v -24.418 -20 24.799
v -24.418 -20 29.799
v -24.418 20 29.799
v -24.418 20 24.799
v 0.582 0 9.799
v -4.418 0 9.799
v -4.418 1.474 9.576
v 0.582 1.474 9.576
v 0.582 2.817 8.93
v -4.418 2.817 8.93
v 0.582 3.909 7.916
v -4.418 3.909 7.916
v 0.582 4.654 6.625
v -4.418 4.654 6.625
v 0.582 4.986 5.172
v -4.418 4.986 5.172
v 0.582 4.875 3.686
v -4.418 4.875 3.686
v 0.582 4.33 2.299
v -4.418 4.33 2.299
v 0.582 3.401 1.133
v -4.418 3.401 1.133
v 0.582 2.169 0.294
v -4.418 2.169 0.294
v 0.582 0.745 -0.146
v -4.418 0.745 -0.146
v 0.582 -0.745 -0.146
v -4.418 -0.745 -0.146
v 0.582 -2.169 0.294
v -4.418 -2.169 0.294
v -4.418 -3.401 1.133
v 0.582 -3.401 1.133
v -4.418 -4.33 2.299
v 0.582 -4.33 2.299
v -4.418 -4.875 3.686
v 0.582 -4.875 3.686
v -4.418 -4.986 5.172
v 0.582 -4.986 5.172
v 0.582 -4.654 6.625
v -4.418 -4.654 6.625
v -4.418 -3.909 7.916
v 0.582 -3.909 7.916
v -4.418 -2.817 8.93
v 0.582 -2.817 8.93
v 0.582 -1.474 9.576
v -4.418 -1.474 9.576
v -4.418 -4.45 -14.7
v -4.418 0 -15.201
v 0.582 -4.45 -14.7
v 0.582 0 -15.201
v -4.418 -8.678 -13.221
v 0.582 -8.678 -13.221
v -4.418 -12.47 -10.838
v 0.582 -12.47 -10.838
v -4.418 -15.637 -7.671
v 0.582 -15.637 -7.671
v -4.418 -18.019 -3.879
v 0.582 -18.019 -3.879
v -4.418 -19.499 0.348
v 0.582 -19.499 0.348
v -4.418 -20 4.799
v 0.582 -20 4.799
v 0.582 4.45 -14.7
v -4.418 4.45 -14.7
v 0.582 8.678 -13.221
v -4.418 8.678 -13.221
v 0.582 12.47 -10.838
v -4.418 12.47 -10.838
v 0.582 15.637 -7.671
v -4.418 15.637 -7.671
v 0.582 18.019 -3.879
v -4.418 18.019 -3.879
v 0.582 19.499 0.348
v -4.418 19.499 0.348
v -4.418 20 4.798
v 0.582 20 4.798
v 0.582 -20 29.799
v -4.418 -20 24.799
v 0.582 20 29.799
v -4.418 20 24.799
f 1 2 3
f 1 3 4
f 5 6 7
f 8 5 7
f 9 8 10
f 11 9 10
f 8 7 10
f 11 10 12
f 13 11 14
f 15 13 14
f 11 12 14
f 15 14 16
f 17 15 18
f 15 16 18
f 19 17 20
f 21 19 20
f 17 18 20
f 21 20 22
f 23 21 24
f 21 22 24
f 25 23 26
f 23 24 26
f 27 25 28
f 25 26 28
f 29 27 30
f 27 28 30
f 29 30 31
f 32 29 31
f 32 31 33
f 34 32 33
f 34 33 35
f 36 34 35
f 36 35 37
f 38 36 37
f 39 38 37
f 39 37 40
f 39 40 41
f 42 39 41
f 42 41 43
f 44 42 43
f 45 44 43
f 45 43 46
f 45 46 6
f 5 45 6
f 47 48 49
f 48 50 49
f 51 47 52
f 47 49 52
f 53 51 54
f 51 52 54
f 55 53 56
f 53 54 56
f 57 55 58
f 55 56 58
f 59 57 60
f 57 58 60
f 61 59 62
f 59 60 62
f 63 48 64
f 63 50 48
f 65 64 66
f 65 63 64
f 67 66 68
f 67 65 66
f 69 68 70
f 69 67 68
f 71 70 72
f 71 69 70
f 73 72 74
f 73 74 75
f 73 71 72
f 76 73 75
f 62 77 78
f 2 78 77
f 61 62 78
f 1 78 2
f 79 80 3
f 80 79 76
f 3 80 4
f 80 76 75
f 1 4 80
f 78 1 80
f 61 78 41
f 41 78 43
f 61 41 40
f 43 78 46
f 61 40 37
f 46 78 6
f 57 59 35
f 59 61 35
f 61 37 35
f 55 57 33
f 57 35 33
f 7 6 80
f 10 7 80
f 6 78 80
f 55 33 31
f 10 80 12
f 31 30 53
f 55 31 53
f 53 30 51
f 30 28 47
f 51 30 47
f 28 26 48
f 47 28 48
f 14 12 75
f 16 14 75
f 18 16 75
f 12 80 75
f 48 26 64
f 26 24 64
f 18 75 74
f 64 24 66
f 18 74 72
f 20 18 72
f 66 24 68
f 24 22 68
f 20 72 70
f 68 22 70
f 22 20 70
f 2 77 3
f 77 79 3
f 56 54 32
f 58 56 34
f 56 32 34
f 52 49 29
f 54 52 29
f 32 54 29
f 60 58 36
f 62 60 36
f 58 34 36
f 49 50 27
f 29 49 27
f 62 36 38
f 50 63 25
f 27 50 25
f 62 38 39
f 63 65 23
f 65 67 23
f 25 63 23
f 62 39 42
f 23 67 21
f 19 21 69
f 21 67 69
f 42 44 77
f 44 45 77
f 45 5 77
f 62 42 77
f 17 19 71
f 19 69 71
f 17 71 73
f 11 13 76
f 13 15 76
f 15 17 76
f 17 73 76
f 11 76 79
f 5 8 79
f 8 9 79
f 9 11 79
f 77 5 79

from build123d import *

# Parameters (mm, degrees)
BOSS_EXTRUDE1_DEPTH = 20
FILLET1_R           = 20
FILLET2_R           = 20
SKETCH2_R           = 5
CUT_EXTRUDE2_DEPTH  = 40


with BuildPart() as part:
    # Sketch1 → Boss-Extrude1 (new, symmetric)
    with BuildSketch(Plane(origin=(0, 0, 0), x_dir=(1, 0, 0), z_dir=(0, 1, 0))):
        Polygon((-4.418120101, 15.201487277), (0.581879899, 15.201487277), (0.581879899, -29.798512723), (-24.418120101, -29.798512723), (-24.418120101, -24.798512723), (-4.418120101, -24.798512723), align=None)
    extrude(amount=BOSS_EXTRUDE1_DEPTH, both=True)

    # Fillet1
    fillet1_edges = [part.edges().sort_by_distance(p)[0] for p in [
        (-1.918120101, -20, -15.201487277),
    ]]
    fillet(fillet1_edges, radius=FILLET1_R)

    # Fillet2
    fillet2_edges = [part.edges().sort_by_distance(p)[0] for p in [
        (-1.918120101, 20, -15.201487277),
    ]]
    fillet(fillet2_edges, radius=FILLET2_R - 0.0001)  # a hair under: the kernel refuses the full size

    # Sketch2 → Cut-Extrude2 (cut)
    with BuildSketch(Plane.ZY.offset(4.418120101)):
        with Locations((4.798512723, 0)):
            Circle(SKETCH2_R)
    extrude(amount=-CUT_EXTRUDE2_DEPTH, mode=Mode.SUBTRACT)


solid = part.part
